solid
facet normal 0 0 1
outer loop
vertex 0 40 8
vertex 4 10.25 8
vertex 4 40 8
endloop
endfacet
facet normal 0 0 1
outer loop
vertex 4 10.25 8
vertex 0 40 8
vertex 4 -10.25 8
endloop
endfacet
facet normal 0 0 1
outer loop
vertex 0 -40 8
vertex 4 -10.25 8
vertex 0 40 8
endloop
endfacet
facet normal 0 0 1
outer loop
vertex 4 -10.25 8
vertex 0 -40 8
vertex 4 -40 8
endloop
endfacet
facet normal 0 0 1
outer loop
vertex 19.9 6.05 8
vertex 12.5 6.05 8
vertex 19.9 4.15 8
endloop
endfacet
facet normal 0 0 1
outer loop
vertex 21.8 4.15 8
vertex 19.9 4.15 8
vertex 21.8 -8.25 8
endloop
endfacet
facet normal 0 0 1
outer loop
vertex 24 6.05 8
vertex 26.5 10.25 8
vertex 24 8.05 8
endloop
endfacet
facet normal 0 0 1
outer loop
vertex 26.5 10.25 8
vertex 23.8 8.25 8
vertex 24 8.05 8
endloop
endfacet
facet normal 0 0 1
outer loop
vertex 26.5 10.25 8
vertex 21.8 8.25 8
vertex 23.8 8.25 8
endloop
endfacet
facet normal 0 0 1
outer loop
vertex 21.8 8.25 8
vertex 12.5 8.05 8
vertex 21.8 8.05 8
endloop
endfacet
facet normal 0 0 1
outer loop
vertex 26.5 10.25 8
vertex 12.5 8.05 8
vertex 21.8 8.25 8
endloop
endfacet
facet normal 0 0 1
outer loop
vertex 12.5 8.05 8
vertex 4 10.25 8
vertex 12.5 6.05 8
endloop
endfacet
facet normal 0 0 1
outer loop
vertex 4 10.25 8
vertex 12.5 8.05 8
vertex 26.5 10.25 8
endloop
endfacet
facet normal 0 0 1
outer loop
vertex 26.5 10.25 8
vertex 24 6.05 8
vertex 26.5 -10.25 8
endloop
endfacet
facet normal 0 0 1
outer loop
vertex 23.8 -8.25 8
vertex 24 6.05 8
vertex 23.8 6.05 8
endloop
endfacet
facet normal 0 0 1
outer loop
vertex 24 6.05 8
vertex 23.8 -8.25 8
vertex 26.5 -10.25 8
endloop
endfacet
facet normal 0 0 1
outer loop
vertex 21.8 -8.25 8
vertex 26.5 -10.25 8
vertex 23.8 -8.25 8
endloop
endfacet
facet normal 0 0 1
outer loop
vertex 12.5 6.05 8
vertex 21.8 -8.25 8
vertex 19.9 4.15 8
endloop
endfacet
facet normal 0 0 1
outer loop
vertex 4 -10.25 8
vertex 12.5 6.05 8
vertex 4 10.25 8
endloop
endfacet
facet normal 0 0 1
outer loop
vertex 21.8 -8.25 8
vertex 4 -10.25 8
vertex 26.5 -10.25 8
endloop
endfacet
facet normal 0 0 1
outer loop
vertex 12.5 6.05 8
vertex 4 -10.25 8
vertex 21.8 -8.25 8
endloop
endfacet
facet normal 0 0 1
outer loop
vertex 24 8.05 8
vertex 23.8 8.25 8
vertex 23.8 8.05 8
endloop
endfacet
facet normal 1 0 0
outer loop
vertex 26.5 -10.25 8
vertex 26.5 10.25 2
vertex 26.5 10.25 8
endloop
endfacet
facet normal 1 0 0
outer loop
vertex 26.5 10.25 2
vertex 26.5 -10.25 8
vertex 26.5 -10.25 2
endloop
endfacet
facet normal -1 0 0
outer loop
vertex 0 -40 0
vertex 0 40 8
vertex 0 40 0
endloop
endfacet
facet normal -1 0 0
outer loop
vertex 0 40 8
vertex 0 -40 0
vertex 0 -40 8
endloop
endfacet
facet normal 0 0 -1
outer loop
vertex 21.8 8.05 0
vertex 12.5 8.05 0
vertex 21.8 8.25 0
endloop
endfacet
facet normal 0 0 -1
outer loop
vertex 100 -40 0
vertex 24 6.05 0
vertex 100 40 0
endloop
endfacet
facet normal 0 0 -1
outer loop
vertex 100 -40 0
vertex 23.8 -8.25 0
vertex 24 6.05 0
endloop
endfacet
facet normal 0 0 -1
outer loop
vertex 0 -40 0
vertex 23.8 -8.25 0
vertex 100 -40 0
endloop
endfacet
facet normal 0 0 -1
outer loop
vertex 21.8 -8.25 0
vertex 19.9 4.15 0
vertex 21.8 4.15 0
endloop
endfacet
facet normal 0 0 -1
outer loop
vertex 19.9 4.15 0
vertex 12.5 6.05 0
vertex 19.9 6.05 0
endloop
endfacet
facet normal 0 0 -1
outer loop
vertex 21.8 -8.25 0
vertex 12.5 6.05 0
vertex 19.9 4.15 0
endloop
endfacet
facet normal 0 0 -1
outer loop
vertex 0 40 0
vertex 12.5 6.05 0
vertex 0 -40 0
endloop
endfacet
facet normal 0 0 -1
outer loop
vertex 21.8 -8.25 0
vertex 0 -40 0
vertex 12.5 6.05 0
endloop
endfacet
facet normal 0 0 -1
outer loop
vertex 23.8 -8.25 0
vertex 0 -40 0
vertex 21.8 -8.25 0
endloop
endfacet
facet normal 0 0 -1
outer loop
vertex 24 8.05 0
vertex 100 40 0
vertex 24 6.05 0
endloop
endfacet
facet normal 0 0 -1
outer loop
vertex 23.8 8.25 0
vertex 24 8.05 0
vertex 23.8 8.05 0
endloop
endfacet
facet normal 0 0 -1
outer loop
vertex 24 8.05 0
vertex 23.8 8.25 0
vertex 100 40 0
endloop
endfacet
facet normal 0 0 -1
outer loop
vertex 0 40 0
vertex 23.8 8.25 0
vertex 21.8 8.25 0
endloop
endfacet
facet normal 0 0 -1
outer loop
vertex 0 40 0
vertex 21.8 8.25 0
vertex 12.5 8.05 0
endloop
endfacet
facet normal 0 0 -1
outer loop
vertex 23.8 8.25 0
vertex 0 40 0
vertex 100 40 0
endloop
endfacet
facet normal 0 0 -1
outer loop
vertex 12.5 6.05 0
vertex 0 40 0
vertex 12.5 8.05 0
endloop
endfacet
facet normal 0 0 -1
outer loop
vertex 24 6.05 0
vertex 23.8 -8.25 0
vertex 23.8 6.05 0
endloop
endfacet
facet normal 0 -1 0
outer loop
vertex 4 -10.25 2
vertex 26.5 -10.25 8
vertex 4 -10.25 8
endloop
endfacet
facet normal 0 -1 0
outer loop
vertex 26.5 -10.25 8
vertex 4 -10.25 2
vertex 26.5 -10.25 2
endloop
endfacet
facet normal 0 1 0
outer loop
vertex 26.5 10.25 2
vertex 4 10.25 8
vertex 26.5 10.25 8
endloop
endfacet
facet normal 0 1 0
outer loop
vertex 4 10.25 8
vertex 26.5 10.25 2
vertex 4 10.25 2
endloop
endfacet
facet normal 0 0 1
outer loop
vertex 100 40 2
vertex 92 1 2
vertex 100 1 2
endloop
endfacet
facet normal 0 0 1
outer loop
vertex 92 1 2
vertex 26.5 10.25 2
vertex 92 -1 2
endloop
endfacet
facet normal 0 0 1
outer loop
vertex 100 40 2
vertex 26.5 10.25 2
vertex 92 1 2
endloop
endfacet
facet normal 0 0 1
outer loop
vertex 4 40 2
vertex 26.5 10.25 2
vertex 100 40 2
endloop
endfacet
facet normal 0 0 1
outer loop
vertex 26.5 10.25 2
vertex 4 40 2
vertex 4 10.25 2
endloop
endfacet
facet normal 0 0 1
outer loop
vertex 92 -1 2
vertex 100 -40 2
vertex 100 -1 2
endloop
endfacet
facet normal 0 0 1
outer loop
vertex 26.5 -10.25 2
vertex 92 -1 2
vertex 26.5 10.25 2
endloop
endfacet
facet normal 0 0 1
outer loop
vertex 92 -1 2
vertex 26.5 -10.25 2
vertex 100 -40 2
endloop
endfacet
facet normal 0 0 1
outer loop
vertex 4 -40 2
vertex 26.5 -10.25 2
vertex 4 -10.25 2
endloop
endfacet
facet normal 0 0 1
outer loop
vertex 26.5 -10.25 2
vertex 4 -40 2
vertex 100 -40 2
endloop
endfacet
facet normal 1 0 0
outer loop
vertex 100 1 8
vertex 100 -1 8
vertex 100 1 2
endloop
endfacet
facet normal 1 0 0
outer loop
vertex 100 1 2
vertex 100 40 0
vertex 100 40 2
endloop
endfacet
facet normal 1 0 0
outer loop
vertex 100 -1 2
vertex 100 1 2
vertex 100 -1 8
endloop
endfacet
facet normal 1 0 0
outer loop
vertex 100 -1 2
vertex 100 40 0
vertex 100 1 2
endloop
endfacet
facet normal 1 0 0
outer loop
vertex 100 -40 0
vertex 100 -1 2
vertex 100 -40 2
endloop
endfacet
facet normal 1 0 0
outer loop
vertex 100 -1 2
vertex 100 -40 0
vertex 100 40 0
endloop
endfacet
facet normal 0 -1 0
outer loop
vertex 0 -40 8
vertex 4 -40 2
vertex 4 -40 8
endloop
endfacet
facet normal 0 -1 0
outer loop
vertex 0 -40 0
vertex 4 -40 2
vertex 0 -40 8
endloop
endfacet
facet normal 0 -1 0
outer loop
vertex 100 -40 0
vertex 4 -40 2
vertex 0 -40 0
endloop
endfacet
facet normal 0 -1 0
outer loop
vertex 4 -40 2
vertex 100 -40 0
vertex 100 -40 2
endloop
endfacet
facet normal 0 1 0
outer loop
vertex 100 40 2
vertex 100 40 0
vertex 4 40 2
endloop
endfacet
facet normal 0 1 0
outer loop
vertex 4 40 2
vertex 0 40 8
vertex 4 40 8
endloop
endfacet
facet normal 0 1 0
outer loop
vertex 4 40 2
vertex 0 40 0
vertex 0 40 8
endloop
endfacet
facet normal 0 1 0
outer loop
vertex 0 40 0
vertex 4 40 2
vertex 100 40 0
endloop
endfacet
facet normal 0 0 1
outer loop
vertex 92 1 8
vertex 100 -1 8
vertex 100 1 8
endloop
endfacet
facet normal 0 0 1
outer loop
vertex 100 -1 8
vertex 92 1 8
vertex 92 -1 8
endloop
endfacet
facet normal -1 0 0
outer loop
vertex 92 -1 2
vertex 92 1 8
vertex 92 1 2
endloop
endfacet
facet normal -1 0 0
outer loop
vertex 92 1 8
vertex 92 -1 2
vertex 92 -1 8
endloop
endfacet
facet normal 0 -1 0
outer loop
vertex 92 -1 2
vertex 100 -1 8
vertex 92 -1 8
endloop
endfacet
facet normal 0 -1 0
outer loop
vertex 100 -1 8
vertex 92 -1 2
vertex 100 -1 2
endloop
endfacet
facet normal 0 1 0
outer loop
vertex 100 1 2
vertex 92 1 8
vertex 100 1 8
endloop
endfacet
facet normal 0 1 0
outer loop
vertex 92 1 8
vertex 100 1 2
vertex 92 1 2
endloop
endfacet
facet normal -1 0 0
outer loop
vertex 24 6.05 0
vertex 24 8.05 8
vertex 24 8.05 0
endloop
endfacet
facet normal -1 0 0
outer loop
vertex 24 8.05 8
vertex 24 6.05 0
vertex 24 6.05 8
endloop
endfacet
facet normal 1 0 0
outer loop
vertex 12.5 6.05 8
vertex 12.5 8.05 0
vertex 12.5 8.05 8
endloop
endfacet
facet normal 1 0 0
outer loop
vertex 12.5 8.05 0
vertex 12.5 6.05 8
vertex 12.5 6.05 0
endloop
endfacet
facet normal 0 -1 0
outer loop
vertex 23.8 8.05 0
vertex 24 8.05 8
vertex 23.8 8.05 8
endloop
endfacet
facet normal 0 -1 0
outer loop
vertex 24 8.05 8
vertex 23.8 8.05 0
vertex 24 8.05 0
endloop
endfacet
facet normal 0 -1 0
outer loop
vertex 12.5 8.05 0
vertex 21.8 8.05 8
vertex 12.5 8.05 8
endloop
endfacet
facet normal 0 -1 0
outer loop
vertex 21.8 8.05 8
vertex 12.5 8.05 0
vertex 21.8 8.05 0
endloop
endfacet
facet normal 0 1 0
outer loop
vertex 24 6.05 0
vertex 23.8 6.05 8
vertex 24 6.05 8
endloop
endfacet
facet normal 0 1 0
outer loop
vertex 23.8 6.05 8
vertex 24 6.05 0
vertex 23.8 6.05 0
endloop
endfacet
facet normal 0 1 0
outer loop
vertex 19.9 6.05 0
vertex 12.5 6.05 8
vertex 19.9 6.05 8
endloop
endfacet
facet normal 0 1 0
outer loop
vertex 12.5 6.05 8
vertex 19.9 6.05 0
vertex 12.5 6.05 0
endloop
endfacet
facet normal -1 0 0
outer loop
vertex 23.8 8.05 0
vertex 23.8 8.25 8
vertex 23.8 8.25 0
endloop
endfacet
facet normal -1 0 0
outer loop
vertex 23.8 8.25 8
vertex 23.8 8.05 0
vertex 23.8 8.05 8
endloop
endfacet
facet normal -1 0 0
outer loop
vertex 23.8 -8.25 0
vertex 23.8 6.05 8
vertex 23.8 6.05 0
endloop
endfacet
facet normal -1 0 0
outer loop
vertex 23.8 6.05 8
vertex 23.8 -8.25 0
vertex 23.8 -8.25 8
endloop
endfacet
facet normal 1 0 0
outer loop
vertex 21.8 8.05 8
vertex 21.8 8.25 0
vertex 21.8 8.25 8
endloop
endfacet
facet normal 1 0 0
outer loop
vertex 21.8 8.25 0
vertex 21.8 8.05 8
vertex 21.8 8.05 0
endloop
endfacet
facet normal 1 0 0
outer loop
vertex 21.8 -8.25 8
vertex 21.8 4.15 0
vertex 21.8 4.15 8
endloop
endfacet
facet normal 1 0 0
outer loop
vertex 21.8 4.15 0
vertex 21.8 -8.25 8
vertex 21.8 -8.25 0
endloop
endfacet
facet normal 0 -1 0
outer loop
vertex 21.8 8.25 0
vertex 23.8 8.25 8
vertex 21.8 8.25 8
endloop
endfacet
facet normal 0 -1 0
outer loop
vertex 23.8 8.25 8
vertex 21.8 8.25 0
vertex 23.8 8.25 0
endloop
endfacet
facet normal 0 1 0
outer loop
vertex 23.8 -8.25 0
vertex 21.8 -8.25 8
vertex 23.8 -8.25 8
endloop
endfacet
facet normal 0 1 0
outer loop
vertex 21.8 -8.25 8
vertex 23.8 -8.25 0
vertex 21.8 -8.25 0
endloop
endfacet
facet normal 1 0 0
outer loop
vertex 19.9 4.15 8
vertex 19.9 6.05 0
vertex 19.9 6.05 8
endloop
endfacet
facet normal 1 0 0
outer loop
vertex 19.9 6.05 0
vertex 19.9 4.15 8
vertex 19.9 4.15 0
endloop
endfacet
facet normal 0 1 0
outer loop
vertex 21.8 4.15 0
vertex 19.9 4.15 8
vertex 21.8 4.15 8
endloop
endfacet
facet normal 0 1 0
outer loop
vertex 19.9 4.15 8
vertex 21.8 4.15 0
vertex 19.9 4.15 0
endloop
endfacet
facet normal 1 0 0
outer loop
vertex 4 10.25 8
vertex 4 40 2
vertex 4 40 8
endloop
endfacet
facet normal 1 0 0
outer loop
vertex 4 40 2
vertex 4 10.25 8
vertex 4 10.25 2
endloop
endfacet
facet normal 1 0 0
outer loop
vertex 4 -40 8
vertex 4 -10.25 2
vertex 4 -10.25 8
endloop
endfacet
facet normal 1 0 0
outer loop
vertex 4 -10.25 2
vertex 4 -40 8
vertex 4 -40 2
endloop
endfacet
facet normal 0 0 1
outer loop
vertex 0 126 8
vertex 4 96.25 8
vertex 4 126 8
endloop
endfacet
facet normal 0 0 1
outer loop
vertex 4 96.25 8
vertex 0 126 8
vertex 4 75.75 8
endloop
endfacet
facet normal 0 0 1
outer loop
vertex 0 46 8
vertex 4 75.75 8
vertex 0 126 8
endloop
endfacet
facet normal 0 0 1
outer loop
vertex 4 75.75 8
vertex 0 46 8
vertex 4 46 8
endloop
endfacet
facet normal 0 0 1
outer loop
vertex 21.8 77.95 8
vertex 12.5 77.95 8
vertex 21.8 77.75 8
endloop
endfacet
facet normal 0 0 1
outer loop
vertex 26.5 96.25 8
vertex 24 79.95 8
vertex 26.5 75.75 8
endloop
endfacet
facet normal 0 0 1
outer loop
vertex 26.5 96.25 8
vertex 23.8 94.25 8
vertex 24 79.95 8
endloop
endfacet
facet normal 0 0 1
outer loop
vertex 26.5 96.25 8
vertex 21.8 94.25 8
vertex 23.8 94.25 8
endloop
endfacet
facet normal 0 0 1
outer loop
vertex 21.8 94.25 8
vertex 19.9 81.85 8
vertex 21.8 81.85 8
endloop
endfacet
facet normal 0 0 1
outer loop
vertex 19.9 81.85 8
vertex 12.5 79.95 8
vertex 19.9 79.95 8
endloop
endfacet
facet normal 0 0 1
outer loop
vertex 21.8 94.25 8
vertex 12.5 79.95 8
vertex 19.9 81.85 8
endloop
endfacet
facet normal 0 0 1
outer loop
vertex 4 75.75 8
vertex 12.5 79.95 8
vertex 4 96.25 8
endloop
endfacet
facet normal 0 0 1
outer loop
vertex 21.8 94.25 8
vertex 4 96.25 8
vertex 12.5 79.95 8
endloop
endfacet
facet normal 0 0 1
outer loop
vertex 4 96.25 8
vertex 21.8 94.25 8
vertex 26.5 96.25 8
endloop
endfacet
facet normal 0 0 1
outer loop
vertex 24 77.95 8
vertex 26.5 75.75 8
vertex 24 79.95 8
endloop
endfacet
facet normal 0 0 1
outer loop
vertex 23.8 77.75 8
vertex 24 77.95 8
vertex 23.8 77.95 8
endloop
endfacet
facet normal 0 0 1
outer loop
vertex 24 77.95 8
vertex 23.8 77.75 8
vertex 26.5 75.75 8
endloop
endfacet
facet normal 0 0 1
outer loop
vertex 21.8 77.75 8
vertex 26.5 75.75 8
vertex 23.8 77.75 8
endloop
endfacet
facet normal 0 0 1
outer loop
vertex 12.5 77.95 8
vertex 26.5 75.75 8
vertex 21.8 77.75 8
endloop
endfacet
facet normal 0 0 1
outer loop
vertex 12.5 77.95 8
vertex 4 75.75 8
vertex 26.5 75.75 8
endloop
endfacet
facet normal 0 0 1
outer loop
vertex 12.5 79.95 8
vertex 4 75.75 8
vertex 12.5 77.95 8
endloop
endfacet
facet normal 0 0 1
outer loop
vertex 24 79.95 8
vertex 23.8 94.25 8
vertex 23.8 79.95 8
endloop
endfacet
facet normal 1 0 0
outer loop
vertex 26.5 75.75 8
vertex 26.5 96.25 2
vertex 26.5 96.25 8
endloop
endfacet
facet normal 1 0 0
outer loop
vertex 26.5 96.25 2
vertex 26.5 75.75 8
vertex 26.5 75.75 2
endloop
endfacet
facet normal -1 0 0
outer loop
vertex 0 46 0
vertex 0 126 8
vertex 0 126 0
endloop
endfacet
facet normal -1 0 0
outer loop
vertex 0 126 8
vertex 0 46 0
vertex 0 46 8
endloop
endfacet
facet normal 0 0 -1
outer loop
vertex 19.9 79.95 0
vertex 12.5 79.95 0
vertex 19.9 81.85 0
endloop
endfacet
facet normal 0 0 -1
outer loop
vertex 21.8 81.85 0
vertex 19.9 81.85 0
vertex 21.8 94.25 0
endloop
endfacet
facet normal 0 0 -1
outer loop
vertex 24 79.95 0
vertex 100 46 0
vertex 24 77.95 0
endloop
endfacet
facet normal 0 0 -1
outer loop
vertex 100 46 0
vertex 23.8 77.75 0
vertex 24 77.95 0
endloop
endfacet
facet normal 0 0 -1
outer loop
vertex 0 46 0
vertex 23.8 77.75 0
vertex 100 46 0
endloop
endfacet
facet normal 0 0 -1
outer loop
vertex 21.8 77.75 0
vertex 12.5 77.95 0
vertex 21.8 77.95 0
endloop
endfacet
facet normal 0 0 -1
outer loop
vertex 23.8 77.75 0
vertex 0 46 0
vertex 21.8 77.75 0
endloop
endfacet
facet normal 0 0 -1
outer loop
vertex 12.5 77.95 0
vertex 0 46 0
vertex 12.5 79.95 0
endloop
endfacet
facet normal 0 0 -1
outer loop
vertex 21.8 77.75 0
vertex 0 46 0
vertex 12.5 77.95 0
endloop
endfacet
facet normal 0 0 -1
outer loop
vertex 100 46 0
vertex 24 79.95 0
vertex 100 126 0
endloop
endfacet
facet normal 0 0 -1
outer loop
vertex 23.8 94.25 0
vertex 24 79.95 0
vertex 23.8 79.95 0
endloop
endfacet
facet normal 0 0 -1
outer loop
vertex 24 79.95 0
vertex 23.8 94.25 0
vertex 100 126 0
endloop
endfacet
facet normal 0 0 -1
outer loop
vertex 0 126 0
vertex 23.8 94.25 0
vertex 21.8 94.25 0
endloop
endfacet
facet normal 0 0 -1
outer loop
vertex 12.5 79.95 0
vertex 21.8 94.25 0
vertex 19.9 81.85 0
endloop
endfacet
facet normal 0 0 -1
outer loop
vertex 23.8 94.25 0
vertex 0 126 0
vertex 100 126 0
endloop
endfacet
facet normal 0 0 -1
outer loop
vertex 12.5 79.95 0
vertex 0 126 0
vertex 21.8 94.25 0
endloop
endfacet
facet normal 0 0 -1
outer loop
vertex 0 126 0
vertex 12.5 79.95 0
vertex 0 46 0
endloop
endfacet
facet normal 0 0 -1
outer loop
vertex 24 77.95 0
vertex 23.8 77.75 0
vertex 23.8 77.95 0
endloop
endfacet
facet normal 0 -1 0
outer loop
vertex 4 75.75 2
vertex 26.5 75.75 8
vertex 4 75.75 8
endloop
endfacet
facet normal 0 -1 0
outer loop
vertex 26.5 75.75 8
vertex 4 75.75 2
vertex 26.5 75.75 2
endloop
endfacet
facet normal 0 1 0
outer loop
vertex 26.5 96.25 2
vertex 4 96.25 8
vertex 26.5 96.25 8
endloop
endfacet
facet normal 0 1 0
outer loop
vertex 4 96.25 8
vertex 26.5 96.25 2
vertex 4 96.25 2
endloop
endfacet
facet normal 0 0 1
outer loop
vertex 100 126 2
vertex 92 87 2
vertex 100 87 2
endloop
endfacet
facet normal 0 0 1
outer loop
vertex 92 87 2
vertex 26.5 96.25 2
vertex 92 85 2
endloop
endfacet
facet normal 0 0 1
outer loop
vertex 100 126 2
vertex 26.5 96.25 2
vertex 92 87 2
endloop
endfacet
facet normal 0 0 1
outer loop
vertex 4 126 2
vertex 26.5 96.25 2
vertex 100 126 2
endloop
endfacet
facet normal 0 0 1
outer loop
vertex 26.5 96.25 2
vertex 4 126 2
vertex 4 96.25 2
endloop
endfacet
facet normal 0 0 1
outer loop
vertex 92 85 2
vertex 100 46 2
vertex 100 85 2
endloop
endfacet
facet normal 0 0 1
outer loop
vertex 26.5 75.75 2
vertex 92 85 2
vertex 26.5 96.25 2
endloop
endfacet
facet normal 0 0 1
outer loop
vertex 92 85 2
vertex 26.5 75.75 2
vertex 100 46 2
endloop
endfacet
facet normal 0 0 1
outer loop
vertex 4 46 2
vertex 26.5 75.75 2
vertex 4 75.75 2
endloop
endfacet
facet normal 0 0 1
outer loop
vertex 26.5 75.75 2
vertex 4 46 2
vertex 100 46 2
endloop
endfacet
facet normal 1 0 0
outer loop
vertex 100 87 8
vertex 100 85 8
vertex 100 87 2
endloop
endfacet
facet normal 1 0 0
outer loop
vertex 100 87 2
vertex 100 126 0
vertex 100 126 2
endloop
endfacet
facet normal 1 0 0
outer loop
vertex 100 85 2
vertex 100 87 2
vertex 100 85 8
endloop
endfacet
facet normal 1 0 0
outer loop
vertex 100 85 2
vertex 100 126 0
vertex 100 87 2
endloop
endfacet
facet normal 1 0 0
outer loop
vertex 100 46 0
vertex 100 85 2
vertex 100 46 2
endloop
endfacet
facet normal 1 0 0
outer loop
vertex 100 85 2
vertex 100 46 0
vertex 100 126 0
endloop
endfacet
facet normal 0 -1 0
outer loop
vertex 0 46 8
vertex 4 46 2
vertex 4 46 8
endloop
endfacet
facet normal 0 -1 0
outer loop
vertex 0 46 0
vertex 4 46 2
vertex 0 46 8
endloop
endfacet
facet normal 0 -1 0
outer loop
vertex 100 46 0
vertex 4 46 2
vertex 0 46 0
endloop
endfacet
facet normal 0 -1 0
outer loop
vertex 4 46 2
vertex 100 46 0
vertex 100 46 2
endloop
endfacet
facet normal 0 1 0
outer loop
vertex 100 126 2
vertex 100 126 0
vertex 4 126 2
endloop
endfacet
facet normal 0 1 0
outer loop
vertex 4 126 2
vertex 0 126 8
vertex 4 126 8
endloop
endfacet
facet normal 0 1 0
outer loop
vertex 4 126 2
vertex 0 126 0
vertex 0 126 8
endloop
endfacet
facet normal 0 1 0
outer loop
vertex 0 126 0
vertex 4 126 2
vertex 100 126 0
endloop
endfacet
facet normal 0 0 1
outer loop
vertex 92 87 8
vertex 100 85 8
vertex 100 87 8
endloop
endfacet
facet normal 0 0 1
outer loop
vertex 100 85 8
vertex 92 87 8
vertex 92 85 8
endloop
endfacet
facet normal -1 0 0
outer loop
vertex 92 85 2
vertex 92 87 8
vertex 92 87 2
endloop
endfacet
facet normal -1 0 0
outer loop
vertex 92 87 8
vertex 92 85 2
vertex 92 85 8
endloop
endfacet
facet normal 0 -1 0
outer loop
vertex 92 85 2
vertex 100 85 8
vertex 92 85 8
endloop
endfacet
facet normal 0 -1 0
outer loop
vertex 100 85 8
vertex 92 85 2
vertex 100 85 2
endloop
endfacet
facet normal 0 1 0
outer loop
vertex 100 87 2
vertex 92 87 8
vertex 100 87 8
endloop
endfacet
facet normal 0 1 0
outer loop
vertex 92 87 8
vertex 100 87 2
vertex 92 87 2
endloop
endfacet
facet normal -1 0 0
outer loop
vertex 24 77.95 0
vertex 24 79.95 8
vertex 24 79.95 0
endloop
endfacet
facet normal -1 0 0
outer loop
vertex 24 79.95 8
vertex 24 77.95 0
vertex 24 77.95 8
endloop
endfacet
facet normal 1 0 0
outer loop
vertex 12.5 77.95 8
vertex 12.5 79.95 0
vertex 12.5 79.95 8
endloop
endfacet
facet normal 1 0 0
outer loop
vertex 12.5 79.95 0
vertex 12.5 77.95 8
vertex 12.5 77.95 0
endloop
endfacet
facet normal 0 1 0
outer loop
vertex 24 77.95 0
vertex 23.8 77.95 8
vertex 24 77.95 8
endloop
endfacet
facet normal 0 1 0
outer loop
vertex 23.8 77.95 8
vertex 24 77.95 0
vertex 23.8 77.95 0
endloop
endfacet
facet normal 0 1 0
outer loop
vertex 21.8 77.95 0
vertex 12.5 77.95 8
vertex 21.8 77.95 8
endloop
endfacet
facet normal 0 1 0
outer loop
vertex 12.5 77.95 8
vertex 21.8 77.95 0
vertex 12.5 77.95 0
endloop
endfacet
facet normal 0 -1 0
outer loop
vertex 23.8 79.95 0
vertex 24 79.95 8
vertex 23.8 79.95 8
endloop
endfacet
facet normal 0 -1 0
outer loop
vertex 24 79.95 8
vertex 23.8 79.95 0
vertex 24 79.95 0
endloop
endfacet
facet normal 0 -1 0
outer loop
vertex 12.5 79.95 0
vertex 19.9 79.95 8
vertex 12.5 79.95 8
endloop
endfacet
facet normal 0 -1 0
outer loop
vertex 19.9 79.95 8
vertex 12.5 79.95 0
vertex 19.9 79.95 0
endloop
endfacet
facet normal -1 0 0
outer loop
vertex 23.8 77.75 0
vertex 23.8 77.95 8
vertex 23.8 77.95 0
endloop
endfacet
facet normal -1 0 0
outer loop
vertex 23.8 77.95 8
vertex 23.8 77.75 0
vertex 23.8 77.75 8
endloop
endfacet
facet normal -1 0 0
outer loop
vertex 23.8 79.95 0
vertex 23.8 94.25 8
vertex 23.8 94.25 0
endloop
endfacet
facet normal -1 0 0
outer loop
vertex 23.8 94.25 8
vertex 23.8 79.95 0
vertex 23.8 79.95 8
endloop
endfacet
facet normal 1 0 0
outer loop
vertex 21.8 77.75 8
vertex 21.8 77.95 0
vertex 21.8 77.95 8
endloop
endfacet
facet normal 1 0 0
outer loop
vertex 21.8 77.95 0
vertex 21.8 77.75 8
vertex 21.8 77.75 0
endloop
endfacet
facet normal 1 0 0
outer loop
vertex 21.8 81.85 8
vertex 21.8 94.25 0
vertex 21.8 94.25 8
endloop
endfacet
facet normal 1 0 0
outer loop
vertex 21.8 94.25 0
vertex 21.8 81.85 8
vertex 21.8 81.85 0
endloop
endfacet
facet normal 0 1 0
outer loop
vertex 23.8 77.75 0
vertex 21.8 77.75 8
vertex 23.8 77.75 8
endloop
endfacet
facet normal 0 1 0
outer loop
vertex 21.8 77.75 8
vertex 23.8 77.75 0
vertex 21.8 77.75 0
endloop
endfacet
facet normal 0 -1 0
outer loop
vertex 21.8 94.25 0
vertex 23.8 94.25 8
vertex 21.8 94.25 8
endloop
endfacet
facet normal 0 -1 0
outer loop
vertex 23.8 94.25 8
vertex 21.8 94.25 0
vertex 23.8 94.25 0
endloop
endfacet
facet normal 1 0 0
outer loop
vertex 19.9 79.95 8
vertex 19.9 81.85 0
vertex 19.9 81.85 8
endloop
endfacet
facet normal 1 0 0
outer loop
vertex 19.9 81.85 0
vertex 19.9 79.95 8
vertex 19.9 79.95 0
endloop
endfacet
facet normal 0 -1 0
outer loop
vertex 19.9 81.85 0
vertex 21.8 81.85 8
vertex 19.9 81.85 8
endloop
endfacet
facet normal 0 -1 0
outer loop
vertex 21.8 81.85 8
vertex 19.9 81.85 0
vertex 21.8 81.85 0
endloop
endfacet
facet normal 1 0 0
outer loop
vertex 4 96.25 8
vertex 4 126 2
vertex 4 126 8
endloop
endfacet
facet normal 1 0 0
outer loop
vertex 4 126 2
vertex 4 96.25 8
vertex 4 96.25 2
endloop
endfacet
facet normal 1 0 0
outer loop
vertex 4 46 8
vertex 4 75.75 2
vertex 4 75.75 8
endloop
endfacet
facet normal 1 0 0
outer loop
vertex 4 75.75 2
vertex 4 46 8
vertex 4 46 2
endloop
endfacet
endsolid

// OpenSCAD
$fn=30;
ts=2;


ugol=[10+0.5+1,15+0.5+1,2+0.4];//размеры уголка высота/ширина/толщина
pole=[80,80,ts];// [20,30,ts];;//размеры поля
stk=[ts,10,6*ts];//размеры стойки 
stl=[ts*3+stk.x, ts*3+stk.y, stk.z];//размеры столба

fp=[stk.x-0.2,stk.y-0.4,ugol.y];//форма прижимной пласитны 

hz=10;
hx=4.5;
dlh=10;
hh=100;


test01();
translate([0,pole.y+ts*3,0])test00();

//translate([0,0,ts/2])cube(pole,true);

module test00(){
    rotate([0,90,0])translate([-stl.x/2,0,0]){
        rotate([0,0,180])difference(){
            union(){
                translate([0,0,(fp.z+5*ts)/2])cube([ stl.x,ugol.y+2*ts, fp.z+5*ts],true);
                translate([ts/2-stl.x/2,0,hh/2])cube([ ts,pole.y, hh],true);
                translate([stl.x/2-stl.x/2,0,-stl.x/2+hh])cube([ stl.x,ts, stl.x],true);
            }
            translate([0,0,(fp.z-5*ts)])ug();
        }
        translate([0,0,ts])cube([ stl.x, pole.y, ts*2],true);
    }
}


module test01(){
    rotate([0,90,0])translate([-stl.x/2,0,0]){
        rotate([0,0,180])difference(){
            union(){
                translate([0,0,(fp.z+5*ts)/2])cube([ stl.x,ugol.y+2*ts, fp.z+5*ts],true);
                translate([ts/2-stl.x/2,0,hh/2])cube([ ts,pole.y, hh],true);
                translate([stl.x/2-stl.x/2,0,-stl.x/2+hh])cube([ stl.x,ts, stl.x],true);
            }
            translate([0,0,(fp.z-5*ts)])rotate([0,0,180])ug();
        }
        translate([0,0,ts])cube([ stl.x, pole.y, ts*2],true);
    }
}



module ug(){
    translate([0,ugol.y/2-ugol.z/2,ugol.x/2+ts*3])cube([pole.x*2,ts,ugol.x],true);
    translate([0,0,ugol.x/2+ts*3+ugol.x/2-ugol.z/2])cube([pole.x*2+4*ts,ugol.y,ts],true);
    translate([0,ugol.y/2-ugol.z/2-ts+0.1,ugol.x/2+ts*2+ugol.x/2-ugol.z/2+0.1])cube([pole.x*2+4*ts,ts,ts],true);
}
